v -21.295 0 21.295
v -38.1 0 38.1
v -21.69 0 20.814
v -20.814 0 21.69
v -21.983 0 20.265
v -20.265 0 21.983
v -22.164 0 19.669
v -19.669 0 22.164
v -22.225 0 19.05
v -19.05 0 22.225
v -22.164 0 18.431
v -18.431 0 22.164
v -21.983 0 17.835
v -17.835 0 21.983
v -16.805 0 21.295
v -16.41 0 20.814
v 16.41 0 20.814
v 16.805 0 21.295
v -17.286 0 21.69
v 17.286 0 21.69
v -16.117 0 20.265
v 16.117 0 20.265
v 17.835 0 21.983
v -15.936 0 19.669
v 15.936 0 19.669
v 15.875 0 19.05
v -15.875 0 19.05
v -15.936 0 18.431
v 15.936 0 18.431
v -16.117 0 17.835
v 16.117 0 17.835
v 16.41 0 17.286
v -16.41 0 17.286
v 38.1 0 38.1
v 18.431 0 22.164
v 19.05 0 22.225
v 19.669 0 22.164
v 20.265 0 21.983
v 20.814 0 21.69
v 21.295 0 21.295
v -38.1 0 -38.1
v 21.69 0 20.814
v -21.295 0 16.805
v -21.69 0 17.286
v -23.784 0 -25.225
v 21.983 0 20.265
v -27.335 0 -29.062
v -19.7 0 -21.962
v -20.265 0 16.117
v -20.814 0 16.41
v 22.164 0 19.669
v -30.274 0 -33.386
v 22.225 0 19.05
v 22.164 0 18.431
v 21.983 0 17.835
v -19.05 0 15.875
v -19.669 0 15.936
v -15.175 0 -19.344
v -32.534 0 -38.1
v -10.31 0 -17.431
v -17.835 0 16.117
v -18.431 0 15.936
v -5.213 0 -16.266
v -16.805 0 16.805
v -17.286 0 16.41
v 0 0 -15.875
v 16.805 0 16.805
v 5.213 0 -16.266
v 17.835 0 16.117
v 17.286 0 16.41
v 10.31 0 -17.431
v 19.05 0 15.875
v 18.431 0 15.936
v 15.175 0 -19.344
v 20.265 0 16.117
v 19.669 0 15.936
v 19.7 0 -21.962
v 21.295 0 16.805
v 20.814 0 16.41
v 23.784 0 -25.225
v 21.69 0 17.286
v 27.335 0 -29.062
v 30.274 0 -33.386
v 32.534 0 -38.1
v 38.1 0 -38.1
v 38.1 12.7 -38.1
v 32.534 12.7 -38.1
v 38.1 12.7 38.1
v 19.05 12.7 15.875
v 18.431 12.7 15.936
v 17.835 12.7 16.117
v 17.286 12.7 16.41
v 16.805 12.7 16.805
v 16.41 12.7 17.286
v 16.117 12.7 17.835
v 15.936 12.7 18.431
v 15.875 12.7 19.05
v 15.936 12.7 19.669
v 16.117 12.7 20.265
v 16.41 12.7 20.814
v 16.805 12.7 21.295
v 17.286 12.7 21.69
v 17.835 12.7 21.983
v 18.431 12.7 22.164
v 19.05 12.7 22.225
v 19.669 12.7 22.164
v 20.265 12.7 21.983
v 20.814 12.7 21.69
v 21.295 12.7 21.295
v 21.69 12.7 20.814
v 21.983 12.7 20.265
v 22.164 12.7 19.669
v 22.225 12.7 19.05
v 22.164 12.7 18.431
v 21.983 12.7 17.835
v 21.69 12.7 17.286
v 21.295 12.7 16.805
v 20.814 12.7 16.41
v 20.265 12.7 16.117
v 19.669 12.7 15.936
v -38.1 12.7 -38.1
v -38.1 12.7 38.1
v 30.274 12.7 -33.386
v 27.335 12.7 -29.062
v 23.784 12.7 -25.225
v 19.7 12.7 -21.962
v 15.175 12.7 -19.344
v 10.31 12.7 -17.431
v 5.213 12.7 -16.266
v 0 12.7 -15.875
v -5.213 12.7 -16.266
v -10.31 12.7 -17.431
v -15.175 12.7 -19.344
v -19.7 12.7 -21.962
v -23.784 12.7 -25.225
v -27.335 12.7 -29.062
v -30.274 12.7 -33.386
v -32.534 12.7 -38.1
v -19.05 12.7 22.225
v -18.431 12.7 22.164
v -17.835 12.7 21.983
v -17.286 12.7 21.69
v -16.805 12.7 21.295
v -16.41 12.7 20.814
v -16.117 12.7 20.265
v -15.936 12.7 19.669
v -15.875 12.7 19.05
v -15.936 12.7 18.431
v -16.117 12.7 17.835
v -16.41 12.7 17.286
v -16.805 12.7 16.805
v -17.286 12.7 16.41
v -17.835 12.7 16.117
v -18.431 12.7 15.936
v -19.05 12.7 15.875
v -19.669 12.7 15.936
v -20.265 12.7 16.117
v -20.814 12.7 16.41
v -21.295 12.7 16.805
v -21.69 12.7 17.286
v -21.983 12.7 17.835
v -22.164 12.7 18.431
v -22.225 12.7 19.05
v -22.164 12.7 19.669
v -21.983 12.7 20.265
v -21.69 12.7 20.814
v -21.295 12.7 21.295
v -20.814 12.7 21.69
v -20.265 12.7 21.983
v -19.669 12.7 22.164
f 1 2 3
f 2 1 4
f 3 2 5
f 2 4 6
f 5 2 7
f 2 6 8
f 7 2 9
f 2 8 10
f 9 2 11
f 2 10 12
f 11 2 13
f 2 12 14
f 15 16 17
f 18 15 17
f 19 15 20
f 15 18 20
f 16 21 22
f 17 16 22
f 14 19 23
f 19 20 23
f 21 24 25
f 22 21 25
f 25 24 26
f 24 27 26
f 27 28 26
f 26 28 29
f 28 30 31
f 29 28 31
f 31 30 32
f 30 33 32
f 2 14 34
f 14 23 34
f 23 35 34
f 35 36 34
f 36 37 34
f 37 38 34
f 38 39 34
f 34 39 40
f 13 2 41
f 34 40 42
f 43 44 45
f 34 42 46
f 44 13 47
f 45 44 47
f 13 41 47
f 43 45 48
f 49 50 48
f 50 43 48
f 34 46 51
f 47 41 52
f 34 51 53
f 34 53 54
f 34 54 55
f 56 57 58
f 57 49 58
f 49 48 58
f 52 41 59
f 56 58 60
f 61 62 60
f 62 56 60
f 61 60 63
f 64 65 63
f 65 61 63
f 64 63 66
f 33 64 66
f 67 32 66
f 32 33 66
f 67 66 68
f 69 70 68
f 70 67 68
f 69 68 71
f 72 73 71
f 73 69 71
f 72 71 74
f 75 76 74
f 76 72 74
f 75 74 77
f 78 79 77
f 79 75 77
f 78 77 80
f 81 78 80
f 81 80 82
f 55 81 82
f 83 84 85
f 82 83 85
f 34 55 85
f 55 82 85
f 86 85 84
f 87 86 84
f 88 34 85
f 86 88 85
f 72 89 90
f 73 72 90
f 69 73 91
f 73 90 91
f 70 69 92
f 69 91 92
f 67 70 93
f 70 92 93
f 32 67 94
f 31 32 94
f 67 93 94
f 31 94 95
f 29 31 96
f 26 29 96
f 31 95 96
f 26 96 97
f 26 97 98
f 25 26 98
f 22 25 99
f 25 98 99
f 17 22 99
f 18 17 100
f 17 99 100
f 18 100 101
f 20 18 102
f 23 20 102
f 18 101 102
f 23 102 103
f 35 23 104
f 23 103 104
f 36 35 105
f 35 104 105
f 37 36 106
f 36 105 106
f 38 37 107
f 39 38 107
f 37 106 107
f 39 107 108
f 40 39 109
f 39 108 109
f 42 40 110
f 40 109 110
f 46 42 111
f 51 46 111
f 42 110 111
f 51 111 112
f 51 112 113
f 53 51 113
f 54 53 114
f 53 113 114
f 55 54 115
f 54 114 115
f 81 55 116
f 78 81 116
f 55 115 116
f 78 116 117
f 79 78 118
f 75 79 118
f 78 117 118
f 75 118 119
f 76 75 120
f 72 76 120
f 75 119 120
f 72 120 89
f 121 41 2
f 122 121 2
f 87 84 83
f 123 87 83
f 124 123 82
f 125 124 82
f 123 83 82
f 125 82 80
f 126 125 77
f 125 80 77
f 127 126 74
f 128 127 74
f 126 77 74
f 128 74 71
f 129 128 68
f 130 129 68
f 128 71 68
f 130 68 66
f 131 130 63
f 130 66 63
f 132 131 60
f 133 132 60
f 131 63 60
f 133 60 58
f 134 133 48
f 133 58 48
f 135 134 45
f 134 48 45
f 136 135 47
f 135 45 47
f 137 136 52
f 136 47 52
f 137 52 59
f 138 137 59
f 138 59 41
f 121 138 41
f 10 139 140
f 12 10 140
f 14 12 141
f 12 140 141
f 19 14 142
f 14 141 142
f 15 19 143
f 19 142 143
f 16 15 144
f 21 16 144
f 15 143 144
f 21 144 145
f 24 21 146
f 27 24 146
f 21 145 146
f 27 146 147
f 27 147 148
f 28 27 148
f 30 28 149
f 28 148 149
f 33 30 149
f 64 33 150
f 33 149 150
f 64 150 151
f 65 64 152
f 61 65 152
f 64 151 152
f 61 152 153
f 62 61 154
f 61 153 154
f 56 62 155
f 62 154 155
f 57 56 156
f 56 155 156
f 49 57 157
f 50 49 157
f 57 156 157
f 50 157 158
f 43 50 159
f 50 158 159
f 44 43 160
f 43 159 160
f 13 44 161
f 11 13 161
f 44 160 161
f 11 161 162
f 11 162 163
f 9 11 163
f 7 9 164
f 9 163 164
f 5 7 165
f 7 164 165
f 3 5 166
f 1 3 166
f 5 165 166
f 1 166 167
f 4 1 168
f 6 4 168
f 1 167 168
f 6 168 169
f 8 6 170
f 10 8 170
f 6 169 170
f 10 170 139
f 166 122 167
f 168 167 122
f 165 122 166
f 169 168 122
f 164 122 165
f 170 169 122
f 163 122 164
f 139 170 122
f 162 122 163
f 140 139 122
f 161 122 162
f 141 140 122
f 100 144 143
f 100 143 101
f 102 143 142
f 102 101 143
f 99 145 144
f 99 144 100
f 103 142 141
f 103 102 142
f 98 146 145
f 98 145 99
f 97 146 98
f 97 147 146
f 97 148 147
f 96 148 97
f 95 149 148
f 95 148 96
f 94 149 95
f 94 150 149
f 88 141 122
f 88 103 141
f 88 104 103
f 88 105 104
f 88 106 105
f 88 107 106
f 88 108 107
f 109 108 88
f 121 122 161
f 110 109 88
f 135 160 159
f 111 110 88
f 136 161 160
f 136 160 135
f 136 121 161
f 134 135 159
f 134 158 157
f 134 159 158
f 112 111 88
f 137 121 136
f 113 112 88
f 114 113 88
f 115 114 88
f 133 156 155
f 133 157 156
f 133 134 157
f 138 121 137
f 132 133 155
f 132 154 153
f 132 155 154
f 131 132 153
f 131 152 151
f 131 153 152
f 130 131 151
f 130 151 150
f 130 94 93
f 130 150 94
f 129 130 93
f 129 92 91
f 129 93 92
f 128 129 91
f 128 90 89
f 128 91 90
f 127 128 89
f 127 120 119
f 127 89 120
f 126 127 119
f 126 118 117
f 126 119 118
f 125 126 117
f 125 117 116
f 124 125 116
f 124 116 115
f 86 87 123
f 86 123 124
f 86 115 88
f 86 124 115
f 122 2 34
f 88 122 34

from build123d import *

# Parameters (mm, degrees)
BOSS_EXTRUDE1_DEPTH = 12.7
SKETCH2_R           = 3.175
CUT_EXTRUDE1_DEPTH  = 12.7


with BuildPart() as part:
    # Sketch1 → Boss-Extrude1 (new body)
    with BuildSketch(Plane(origin=(0, 0, 0), x_dir=(1, 0, 0), z_dir=(0, 1, 0))):
        with BuildLine():
            Line((38.1, 38.1), (32.534068682, 38.1))
            ThreePointArc((32.534068682, 38.1), (0, 15.875), (-32.534068682, 38.1))
            Line((-32.534068682, 38.1), (-38.1, 38.1))
            Line((-38.1, 38.1), (-38.1, -38.1))
            Line((-38.1, -38.1), (38.1, -38.1))
            Line((38.1, -38.1), (38.1, 38.1))
        make_face()
    extrude(amount=BOSS_EXTRUDE1_DEPTH)

    # Sketch2 → Cut-Extrude1 (cut)
    with BuildSketch(Plane(origin=(0, 12.7, 0), x_dir=(1, 0, 0), z_dir=(0, 1, 0))):
        with Locations(Location((-19.05, -19.05, 0), (0, 0, 270))):
            Circle(SKETCH2_R)
        with Locations(Location((19.05, -19.05, 0), (0, 0, 90))):
            Circle(SKETCH2_R)
    extrude(amount=-CUT_EXTRUDE1_DEPTH, mode=Mode.SUBTRACT)


solid = part.part
